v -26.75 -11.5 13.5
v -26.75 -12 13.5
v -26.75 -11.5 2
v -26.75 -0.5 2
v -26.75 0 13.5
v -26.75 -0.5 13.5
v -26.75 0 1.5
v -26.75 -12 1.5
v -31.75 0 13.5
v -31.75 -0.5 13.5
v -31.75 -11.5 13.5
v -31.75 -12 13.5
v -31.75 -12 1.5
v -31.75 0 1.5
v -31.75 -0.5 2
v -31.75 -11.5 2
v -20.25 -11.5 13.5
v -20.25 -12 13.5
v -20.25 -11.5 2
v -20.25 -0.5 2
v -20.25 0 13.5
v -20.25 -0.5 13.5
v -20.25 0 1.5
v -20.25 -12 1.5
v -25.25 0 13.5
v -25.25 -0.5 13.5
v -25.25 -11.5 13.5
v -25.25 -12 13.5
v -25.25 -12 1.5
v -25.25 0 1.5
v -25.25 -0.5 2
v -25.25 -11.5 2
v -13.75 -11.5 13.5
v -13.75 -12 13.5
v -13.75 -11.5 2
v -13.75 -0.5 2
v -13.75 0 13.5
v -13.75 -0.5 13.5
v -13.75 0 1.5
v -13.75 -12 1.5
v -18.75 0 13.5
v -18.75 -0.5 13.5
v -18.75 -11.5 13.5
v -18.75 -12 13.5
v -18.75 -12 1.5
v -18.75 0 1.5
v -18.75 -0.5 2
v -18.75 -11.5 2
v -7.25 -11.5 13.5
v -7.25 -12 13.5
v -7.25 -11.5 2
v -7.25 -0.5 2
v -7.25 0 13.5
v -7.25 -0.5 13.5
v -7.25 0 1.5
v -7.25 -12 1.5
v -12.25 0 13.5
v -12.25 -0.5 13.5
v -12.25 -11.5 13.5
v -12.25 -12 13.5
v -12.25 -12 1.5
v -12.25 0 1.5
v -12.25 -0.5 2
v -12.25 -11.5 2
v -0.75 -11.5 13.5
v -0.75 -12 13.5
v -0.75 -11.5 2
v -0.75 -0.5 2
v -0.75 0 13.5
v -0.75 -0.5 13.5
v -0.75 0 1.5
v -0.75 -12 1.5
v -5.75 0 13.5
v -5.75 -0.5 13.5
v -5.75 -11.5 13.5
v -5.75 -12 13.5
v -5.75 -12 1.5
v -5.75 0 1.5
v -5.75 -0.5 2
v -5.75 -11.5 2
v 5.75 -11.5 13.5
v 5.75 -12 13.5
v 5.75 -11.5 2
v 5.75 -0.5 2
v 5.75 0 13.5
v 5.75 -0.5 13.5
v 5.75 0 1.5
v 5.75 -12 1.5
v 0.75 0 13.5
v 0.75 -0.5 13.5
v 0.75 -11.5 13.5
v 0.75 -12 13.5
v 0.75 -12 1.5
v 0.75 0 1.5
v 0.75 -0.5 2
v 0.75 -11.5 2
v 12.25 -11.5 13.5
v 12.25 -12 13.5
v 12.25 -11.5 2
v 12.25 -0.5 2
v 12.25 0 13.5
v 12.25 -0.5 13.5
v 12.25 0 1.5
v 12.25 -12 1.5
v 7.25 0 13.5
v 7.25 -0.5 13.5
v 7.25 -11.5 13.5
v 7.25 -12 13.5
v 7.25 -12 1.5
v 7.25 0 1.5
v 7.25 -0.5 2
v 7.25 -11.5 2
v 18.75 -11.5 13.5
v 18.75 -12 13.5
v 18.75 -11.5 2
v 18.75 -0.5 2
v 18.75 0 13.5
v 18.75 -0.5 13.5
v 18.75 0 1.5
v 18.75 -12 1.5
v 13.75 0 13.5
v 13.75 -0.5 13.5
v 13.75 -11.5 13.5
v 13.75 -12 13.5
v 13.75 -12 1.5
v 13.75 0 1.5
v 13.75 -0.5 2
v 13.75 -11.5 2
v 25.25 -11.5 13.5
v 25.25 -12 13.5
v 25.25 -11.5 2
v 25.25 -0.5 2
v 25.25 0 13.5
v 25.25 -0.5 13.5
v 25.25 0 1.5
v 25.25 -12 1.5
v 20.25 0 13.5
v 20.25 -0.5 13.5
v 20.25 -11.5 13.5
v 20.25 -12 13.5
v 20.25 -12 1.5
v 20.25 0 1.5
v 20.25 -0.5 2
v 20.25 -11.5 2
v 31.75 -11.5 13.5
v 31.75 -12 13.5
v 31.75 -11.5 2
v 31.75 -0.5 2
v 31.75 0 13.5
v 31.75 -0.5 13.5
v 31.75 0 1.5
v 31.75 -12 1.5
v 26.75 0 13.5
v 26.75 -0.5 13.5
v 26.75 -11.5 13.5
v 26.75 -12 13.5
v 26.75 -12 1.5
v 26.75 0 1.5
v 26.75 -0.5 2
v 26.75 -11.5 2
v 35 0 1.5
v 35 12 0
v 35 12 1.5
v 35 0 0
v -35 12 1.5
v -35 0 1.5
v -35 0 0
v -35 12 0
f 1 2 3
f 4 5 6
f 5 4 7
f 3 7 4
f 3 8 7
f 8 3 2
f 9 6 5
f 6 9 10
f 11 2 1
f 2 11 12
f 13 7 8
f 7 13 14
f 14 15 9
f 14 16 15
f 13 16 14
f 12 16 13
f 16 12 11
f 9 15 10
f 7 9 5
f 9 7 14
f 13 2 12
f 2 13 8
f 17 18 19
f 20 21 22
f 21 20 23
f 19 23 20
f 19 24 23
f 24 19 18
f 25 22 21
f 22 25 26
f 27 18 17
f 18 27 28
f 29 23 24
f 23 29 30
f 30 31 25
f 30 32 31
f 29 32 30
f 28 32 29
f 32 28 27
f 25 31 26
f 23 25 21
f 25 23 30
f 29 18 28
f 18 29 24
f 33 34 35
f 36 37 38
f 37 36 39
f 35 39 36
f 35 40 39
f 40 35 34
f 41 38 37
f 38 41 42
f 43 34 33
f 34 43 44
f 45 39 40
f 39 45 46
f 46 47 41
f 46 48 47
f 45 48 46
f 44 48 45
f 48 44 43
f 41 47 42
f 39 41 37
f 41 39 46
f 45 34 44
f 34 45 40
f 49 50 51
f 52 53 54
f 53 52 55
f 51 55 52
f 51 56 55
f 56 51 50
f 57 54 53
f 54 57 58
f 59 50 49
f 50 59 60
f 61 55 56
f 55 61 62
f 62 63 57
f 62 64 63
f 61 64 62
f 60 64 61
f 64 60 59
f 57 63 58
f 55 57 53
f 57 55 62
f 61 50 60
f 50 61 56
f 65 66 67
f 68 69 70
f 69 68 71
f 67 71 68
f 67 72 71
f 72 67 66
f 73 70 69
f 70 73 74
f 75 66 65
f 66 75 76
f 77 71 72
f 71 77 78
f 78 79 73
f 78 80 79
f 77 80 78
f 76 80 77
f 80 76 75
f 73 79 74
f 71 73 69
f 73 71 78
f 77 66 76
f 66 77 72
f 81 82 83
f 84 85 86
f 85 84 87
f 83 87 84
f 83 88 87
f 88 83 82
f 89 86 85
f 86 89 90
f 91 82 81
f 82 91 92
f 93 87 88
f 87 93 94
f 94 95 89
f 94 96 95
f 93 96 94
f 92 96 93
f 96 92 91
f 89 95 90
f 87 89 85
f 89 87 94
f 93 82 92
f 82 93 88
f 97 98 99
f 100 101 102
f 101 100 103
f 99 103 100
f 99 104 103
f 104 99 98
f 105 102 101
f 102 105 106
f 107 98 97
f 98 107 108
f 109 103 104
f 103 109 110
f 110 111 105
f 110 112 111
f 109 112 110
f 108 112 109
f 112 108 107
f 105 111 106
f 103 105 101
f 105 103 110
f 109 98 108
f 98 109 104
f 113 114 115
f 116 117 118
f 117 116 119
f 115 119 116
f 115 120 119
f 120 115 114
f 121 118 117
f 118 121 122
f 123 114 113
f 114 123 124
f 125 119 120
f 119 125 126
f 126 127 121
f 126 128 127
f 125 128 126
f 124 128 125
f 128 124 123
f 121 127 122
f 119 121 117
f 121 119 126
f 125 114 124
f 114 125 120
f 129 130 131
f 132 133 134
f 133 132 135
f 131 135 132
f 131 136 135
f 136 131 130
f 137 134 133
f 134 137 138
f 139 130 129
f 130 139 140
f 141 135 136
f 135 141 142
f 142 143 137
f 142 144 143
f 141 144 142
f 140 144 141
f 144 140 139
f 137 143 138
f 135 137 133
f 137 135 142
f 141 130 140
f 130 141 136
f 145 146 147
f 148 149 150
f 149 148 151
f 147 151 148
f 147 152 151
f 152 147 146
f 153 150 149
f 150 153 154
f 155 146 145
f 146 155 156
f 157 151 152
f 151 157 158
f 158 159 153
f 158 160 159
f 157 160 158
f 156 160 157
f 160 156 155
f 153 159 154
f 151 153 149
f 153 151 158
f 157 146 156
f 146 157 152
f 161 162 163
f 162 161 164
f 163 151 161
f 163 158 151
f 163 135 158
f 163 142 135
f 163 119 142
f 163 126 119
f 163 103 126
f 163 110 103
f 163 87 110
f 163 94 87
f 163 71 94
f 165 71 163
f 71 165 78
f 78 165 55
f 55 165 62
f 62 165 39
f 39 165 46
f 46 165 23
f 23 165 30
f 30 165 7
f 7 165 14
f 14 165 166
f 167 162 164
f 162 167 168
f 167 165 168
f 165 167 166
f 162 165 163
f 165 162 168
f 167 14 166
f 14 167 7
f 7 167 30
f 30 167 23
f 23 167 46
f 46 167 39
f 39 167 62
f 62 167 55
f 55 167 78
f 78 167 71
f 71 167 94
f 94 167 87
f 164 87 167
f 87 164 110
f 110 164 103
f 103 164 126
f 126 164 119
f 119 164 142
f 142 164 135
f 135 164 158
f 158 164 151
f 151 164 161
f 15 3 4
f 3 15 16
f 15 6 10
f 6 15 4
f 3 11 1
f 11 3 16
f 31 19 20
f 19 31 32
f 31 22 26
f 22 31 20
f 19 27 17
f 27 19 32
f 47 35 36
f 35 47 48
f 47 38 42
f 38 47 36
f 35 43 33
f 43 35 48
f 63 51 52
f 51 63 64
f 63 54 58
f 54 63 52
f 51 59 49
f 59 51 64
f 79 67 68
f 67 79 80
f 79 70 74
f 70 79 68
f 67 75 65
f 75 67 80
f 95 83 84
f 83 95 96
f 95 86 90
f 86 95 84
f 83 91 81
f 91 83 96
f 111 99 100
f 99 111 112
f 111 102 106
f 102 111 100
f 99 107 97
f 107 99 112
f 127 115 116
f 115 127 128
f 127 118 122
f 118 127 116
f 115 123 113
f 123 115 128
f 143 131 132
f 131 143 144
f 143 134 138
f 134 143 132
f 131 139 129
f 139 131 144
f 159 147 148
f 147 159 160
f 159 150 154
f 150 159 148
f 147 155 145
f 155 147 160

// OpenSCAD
// 10-well comb for casting agarose gels
// Print orientation: flat on bed, teeth pointing down (-Y)

// ---------- Parameters ----------
plate_t      = 1.5;   // plate thickness (Z)
spine_len    = 70;    // spine length along X
spine_w      = 12;    // spine width along Y
tooth_count  = 10;    // number of teeth
tooth_w      = 5.0;   // tooth width along X
tooth_len    = 12;    // tooth length along Y
tooth_h      = 12;    // tooth height from top edge of spine (Z)
gap          = 1.5;   // gap between neighbouring teeth (X)
eps          = 0.5;   // cutter overshoot past faces

$fn = 64;

// ---------- Derived ----------
pitch   = tooth_w + gap;                 // centre-to-centre spacing
x_start = -(tooth_count - 1) * pitch / 2; // first tooth centre (row centred)

// ---------- Model ----------
difference() {
    union() {
        // Spine (back bar)
        translate([-spine_len / 2, 0, 0])
            cube([spine_len, spine_w, plate_t]);

        // Teeth hanging in -Y direction
        for (i = [0 : tooth_count - 1])
            translate([x_start + i * pitch - tooth_w / 2,
                       -tooth_len,
                       plate_t])
                cube([tooth_w, tooth_len, tooth_h]);
    }

    // Clean up overlapping tooth / spine faces (coplanar removal)
    for (i = [0 : tooth_count - 1])
        translate([x_start + i * pitch - tooth_w / 2 - eps,
                   -tooth_len + eps,
                   plate_t + eps])
            cube([tooth_w + 2 * eps, tooth_len - 2 * eps, tooth_h + eps]);
}
